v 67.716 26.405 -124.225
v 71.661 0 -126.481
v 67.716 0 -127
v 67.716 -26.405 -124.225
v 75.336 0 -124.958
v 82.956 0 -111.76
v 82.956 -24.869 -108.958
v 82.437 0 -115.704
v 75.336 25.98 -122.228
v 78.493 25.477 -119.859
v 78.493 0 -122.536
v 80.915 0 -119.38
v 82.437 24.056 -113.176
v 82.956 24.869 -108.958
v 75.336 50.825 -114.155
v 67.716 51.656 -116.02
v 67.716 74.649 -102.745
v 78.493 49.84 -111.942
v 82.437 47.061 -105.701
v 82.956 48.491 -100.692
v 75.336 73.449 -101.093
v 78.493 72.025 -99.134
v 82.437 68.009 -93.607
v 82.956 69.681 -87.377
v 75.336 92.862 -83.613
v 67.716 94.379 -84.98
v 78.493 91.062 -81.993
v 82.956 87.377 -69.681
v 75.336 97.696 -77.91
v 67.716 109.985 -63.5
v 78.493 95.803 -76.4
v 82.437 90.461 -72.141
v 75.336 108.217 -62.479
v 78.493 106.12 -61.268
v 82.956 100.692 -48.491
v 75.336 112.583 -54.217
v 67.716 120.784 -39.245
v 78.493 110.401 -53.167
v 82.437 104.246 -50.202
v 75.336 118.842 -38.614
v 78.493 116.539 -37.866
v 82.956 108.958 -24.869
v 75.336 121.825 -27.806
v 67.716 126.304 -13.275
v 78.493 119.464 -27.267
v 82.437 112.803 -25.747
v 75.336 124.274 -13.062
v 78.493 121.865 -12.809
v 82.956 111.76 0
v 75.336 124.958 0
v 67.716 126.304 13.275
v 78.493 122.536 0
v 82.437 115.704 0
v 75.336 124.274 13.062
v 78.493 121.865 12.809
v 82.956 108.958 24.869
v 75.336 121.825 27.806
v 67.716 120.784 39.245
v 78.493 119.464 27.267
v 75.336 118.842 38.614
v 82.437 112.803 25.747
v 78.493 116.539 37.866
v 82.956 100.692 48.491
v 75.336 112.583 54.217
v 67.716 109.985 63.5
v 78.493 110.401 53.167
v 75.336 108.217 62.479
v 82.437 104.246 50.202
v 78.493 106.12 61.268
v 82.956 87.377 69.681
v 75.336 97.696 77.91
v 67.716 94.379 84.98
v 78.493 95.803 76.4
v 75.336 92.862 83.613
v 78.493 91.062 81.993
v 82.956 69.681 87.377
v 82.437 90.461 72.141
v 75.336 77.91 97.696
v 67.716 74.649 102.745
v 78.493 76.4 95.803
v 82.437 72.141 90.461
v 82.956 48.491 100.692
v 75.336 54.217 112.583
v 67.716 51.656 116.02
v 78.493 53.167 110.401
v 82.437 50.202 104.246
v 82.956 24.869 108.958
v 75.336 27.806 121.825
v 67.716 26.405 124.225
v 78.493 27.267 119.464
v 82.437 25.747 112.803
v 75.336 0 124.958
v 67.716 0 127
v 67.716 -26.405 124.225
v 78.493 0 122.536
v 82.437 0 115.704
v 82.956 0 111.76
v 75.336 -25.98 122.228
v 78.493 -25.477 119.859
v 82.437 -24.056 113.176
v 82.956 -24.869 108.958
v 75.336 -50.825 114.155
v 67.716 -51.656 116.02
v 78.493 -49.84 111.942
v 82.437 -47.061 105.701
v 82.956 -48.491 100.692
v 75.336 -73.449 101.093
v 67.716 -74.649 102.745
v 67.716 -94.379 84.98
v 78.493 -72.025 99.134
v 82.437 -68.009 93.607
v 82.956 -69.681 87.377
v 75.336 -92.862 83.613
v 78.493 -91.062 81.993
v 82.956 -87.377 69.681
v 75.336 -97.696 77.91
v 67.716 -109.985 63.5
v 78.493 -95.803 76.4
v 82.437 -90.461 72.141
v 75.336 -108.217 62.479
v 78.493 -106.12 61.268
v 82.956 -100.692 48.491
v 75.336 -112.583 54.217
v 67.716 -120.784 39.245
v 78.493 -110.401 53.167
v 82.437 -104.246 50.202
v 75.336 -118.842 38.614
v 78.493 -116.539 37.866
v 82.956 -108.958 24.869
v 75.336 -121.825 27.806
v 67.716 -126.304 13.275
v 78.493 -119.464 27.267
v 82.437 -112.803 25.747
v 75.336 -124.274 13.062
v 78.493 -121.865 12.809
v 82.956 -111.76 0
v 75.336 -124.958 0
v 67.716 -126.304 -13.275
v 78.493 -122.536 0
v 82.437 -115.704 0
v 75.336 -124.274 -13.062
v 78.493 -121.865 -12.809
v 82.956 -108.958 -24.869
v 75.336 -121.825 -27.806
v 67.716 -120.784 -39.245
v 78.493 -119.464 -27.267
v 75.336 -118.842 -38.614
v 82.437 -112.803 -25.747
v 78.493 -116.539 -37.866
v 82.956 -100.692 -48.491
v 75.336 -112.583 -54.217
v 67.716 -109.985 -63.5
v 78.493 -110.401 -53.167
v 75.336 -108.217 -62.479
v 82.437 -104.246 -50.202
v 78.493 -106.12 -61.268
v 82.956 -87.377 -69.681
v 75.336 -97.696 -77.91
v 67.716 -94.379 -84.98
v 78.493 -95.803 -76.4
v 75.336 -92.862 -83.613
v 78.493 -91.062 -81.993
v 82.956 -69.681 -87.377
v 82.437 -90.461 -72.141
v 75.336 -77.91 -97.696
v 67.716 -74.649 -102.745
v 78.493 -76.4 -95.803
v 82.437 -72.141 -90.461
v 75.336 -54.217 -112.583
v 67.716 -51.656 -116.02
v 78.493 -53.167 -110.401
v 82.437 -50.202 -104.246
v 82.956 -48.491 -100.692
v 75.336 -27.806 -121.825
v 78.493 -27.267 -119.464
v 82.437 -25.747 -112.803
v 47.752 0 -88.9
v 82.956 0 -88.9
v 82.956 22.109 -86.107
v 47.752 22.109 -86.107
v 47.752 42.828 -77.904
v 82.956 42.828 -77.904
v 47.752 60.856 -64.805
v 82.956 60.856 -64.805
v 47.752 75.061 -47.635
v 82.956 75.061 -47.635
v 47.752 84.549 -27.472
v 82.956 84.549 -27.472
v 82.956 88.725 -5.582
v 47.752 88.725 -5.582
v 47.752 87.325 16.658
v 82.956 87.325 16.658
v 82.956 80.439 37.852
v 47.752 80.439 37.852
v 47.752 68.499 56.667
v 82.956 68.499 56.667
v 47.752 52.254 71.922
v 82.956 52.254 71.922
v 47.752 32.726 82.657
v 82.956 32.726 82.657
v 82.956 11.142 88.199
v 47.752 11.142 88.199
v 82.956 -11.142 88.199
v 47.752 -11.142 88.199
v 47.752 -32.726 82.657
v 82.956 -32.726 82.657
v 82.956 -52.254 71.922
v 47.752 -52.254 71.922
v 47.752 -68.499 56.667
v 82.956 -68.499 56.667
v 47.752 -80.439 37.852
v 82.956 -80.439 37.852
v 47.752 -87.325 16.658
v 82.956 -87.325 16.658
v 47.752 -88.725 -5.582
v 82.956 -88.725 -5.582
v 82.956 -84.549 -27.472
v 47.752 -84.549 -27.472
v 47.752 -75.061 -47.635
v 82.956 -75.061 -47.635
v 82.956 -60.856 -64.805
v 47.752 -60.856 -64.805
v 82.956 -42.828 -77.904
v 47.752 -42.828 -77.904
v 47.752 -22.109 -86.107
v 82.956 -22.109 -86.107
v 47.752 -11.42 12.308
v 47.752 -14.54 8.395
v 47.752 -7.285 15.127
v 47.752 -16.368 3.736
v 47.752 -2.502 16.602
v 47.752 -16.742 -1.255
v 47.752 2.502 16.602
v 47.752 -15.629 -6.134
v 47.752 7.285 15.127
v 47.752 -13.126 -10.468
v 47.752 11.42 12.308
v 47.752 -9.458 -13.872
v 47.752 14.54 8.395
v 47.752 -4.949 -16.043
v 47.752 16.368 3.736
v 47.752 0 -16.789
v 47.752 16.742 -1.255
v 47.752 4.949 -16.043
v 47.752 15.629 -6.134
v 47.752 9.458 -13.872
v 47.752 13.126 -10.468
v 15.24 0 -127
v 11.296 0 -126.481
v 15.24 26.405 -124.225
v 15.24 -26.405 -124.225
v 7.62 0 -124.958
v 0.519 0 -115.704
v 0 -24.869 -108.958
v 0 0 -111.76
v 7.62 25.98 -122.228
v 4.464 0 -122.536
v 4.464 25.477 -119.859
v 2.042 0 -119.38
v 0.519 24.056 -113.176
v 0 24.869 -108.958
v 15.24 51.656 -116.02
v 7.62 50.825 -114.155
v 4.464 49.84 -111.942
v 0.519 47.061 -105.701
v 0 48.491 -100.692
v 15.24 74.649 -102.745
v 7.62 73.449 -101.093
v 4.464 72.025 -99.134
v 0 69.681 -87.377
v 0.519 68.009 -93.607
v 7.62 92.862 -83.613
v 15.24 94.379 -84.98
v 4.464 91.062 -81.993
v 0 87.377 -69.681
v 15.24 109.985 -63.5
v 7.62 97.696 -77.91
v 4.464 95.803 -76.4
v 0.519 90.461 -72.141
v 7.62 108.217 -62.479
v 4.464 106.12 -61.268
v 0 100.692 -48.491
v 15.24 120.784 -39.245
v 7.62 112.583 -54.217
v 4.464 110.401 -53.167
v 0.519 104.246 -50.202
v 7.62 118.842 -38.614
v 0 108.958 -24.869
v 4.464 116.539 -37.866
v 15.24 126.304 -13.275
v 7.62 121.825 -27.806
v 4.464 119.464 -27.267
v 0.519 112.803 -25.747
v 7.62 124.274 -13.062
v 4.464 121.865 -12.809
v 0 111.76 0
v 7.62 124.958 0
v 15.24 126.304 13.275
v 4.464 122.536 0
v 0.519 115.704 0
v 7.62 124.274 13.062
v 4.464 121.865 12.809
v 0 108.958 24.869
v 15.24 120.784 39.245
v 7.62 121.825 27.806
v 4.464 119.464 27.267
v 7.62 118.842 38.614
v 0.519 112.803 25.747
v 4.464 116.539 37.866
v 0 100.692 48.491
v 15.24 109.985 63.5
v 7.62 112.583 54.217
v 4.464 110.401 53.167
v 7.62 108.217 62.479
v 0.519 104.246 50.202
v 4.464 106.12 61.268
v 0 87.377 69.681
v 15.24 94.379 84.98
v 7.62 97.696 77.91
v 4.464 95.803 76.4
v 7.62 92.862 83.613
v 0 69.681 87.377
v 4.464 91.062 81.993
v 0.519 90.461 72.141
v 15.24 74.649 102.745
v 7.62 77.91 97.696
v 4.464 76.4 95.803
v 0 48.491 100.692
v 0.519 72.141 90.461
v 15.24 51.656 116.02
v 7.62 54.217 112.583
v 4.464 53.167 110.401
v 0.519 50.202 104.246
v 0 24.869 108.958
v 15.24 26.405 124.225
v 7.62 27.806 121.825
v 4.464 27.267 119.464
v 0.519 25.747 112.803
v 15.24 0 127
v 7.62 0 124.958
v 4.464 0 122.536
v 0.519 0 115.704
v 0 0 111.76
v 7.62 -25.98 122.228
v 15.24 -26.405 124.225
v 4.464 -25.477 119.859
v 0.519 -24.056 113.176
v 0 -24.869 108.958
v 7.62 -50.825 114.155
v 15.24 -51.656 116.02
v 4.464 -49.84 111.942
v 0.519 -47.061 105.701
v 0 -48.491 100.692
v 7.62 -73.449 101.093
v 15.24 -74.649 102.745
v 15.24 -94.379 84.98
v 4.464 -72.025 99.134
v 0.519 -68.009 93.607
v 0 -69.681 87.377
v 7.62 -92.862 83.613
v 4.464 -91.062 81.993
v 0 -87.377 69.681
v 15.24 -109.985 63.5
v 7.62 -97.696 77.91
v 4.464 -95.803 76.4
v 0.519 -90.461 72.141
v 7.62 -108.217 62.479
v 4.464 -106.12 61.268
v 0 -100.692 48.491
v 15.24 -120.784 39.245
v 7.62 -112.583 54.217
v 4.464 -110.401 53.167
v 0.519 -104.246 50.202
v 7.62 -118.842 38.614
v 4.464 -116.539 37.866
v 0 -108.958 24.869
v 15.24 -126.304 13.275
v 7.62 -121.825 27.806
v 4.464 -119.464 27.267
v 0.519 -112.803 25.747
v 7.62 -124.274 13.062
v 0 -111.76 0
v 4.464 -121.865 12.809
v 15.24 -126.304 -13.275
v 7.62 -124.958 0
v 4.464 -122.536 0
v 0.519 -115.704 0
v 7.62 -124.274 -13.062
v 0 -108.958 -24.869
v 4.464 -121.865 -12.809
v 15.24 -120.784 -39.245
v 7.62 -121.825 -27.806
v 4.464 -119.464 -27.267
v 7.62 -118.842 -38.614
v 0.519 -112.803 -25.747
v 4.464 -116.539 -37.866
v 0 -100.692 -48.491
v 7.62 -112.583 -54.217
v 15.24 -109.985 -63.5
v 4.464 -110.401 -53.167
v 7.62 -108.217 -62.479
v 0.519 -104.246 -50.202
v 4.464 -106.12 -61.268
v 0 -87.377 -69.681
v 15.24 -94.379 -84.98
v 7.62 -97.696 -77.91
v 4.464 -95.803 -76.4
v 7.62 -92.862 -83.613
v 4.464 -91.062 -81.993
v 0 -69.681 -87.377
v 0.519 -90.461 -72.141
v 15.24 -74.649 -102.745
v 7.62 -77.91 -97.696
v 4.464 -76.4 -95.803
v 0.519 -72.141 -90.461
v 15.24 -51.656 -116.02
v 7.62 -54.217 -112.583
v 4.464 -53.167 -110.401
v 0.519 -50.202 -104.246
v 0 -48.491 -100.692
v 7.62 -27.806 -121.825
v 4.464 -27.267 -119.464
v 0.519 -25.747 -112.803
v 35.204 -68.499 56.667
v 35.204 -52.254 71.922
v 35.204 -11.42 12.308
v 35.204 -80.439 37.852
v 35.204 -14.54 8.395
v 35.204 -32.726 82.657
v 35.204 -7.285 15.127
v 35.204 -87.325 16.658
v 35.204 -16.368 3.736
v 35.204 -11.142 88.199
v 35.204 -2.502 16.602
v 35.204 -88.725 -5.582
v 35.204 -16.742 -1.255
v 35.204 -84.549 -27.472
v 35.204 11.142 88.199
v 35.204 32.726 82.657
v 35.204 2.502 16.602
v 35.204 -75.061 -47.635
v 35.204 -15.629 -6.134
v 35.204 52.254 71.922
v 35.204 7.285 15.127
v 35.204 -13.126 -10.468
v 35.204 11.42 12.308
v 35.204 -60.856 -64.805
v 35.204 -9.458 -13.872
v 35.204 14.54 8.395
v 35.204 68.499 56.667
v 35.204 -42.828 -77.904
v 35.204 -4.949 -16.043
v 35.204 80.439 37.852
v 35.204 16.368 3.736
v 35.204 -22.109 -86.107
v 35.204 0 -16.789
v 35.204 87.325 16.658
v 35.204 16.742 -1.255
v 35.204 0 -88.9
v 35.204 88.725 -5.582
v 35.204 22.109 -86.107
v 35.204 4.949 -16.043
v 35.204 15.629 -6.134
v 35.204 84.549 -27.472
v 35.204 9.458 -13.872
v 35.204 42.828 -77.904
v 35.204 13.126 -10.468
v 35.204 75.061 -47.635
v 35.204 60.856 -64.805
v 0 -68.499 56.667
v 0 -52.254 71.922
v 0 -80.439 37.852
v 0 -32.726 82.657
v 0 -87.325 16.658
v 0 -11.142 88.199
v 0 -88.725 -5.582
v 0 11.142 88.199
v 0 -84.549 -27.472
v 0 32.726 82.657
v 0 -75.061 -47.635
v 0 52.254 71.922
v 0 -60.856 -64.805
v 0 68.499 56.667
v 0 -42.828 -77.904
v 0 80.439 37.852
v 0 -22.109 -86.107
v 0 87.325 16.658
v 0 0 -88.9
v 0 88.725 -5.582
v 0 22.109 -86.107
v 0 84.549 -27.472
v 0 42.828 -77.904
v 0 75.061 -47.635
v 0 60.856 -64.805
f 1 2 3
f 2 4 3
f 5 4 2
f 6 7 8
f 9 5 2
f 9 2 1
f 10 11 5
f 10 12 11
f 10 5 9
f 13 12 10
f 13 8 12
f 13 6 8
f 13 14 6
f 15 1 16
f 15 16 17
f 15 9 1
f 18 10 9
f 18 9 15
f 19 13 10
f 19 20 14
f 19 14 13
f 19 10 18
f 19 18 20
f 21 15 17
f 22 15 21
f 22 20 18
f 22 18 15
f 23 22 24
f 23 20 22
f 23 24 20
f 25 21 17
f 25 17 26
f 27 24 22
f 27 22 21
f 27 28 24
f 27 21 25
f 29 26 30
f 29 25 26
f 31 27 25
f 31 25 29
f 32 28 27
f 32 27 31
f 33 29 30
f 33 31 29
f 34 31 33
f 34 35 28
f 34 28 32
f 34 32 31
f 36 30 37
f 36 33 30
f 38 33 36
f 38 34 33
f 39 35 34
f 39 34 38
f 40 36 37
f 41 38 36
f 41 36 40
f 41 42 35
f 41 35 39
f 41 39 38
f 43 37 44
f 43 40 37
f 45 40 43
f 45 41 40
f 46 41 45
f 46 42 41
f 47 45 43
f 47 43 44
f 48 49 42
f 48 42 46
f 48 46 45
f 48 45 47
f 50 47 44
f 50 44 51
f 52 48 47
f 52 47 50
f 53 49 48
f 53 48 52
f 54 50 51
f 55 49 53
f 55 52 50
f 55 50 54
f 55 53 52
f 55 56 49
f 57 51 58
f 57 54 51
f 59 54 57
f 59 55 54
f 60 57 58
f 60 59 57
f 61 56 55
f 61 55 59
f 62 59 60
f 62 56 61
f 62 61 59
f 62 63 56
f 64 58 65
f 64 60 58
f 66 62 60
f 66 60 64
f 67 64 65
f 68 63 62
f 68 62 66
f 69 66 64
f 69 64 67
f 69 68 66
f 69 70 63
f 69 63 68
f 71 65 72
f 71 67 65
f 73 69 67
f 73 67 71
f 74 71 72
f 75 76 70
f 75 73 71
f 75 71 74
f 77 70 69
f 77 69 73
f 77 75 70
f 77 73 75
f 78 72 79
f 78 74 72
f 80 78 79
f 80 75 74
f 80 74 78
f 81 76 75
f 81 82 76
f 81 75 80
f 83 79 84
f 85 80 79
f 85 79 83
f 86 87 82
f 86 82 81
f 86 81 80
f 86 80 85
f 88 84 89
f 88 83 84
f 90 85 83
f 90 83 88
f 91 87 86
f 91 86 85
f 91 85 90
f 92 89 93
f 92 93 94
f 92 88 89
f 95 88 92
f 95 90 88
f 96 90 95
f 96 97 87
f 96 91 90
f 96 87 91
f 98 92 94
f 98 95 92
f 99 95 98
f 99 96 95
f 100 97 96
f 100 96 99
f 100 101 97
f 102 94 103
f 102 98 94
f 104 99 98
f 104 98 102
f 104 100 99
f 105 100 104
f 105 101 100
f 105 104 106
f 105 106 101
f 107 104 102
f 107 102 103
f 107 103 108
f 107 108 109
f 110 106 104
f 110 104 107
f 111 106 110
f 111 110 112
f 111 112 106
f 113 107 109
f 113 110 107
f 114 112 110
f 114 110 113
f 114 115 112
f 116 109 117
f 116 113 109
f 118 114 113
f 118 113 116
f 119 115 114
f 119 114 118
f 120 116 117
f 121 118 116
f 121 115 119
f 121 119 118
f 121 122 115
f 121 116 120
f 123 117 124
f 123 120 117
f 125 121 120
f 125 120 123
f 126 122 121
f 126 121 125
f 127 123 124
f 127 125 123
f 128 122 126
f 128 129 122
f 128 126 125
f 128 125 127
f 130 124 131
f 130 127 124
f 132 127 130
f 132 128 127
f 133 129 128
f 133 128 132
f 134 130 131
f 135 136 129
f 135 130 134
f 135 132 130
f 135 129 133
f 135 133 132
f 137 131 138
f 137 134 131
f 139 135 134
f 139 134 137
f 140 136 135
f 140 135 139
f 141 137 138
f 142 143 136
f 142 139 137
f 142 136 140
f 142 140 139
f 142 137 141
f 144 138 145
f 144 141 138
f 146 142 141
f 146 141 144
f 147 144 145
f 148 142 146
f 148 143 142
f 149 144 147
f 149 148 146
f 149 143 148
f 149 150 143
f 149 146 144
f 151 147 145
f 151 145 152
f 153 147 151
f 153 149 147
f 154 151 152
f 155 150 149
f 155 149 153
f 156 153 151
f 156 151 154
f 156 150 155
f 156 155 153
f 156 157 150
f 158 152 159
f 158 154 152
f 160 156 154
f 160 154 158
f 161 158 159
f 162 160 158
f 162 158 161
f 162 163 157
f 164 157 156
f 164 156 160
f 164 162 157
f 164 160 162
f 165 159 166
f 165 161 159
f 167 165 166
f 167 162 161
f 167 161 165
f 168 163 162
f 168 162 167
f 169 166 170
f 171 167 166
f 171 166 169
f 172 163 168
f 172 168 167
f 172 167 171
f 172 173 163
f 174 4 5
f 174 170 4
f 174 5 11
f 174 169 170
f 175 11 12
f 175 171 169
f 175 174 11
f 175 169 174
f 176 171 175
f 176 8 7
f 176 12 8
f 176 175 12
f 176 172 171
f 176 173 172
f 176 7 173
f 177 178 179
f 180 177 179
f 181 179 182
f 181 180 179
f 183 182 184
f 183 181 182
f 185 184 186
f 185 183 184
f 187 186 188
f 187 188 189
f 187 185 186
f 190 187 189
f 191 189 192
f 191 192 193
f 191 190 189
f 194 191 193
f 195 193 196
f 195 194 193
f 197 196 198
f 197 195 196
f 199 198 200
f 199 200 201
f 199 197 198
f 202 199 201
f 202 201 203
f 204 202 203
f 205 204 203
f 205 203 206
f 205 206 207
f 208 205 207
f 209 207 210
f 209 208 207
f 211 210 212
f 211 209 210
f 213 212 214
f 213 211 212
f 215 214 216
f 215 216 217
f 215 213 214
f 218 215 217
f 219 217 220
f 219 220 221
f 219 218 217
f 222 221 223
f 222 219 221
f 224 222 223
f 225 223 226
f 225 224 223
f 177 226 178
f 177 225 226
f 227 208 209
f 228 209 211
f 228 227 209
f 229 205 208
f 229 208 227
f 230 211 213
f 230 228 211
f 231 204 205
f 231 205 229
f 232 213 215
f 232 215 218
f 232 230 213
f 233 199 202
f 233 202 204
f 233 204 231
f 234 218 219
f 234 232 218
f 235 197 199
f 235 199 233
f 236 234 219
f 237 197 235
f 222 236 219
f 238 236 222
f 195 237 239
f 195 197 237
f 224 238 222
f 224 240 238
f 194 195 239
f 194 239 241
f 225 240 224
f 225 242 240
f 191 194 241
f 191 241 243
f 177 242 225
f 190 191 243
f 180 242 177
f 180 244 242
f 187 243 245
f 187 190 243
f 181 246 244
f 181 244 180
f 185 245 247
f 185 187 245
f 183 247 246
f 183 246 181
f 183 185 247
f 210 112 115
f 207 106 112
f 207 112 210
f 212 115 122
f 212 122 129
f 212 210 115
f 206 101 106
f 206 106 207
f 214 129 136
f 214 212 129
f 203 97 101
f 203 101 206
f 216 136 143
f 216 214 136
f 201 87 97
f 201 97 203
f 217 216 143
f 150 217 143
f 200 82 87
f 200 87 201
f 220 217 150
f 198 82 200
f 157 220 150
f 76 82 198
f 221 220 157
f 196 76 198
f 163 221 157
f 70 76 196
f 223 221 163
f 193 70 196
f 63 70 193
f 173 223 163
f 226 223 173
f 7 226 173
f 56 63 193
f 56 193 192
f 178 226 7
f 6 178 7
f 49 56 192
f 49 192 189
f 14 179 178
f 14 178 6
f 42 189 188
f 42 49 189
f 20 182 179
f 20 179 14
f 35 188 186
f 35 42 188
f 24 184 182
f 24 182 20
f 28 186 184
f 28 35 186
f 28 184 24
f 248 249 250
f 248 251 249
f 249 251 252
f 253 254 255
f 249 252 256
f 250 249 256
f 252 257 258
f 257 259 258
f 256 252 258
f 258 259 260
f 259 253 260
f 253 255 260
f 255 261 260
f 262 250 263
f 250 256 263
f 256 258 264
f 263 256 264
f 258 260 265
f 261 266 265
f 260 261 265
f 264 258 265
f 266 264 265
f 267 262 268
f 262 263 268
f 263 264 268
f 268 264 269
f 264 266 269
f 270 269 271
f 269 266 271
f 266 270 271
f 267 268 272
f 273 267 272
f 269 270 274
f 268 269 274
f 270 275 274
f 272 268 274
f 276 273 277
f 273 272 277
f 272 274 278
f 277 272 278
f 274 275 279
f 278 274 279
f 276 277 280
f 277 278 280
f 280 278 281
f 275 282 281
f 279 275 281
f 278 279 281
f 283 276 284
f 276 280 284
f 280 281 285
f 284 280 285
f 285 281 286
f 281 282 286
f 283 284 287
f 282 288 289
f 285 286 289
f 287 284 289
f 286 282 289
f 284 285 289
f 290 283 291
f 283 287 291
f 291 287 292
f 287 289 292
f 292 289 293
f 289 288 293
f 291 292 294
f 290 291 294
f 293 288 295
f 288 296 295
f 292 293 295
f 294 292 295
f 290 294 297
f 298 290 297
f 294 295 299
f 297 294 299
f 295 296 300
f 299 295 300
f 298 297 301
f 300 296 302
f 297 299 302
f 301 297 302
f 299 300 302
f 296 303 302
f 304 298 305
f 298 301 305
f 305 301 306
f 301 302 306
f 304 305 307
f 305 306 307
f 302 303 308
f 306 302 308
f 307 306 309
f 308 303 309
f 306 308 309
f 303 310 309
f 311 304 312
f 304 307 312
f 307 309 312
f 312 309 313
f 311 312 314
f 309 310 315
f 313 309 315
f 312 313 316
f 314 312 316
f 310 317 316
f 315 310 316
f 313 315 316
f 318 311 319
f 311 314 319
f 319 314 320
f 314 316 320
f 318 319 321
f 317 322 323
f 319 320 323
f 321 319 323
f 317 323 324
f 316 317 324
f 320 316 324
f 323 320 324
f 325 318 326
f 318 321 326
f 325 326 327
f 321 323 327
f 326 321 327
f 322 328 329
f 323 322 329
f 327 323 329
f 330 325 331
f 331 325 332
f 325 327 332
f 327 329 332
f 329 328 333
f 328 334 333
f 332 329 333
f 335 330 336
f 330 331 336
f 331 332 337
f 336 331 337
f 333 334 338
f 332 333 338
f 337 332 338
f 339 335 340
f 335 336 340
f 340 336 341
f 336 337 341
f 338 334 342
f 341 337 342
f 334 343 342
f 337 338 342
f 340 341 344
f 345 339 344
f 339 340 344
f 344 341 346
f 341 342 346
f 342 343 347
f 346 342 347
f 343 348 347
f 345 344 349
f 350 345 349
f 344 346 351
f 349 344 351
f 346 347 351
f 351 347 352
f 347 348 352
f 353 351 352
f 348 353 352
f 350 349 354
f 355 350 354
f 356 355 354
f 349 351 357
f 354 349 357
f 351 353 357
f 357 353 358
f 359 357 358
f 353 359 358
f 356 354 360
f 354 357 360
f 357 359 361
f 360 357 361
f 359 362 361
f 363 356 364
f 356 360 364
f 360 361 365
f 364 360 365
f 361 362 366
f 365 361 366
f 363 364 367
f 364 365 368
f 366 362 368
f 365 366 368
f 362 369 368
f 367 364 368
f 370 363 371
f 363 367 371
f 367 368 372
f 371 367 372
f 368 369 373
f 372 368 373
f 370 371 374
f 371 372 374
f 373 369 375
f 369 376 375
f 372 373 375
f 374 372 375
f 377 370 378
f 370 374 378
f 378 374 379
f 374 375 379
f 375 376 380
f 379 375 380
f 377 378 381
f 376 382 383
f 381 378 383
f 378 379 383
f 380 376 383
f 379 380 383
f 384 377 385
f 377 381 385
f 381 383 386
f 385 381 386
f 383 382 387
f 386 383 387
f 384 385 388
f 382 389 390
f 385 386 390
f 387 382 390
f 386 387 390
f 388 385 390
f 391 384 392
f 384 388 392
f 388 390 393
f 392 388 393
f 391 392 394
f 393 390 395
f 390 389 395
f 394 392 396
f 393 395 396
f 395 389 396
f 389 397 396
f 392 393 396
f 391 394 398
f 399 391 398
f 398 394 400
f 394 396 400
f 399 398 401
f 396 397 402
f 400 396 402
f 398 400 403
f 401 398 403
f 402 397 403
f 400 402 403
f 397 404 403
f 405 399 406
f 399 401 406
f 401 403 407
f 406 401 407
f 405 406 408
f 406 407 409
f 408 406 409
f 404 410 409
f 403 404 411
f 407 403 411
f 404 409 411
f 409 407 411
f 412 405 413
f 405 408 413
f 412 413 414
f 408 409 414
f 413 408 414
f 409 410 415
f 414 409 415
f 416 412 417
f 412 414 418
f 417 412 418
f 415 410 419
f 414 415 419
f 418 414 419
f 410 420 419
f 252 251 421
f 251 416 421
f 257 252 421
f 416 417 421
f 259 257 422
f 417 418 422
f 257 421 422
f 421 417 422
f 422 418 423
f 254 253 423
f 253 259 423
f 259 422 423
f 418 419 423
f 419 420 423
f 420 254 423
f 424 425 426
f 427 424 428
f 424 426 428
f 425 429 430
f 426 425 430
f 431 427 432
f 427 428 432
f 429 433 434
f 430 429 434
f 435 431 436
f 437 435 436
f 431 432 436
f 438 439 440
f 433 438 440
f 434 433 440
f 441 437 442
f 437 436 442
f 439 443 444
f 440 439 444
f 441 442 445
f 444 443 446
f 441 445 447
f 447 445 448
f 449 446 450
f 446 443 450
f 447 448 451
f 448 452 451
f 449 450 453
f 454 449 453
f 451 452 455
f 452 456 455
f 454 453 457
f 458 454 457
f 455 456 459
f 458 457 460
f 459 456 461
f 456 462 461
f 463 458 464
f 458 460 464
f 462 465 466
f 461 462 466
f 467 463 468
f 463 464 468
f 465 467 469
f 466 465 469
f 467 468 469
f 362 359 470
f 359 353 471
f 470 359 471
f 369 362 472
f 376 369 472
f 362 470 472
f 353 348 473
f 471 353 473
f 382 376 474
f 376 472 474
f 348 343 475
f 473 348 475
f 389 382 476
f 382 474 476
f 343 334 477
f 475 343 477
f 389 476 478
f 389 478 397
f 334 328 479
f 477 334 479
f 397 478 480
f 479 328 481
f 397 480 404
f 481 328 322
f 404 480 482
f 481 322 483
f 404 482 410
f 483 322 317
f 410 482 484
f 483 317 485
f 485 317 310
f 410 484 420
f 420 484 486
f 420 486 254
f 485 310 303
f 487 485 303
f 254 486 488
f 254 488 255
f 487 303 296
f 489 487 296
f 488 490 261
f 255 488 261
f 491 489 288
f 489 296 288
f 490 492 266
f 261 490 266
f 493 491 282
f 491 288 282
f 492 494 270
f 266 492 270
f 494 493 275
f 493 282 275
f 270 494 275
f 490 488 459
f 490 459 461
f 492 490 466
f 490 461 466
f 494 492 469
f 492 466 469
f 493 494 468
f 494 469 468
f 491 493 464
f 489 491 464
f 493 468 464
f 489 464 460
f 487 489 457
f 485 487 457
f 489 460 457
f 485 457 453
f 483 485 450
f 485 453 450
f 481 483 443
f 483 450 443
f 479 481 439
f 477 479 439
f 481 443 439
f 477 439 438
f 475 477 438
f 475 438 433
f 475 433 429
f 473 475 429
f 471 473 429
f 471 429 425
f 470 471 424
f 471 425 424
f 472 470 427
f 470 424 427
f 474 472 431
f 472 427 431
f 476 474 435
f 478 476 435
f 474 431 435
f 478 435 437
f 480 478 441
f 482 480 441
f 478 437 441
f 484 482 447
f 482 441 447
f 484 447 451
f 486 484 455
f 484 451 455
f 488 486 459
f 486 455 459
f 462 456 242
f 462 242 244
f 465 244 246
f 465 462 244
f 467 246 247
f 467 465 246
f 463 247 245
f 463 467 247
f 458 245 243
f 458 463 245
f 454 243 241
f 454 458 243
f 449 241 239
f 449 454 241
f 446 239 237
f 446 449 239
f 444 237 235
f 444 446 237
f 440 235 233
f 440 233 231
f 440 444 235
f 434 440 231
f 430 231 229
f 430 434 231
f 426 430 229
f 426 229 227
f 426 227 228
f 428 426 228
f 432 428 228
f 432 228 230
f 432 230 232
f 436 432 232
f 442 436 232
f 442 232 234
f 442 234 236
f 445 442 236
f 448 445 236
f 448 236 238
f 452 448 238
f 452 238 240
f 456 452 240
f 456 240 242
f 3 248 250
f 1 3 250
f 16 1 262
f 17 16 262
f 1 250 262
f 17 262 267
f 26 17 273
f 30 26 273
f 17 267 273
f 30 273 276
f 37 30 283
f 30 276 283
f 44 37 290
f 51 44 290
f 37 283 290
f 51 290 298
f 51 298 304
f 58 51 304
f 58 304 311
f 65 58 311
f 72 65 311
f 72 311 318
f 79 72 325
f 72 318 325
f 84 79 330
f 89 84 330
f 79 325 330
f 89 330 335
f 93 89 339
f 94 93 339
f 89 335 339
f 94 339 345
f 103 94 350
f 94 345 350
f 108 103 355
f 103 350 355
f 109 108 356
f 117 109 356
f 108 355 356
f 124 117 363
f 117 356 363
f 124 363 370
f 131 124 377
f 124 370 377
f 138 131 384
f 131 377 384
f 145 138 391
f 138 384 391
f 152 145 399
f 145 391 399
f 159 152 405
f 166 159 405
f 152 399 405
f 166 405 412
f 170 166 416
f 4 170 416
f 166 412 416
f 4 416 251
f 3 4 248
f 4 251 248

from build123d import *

# Parameters (mm, degrees)
SKETCH1_R           = 127
SKETCH1_R_2         = 16.7894
BOSS_EXTRUDE1_DEPTH = 82.9564
FILLET1_R           = 15.24
CUT_EXTRUDE1_START  = -35.2044
SKETCH2_R           = 88.9
SKETCH2_R_2         = 16.7894
CUT_EXTRUDE1_DEPTH  = 35.2044


with BuildPart() as part:
    # Sketch1 → Boss-Extrude1 (new body)
    with BuildSketch(Plane(origin=(0, 0, 0), x_dir=(0, 0, -1), z_dir=(1, 0, 0))):
        Circle(SKETCH1_R)
        Circle(SKETCH1_R_2, mode=Mode.SUBTRACT)
    extrude(amount=BOSS_EXTRUDE1_DEPTH)

    # Fillet1
    fillet1_edges = [part.edges().sort_by_distance(p)[0] for p in [
        (0, 0, 127),
        (82.9564, 0, 127),
    ]]
    fillet(fillet1_edges, radius=FILLET1_R)

    # Sketch2 → Cut-Extrude1 (cut)
    with BuildSketch(Plane(origin=(82.9564, 0, 0), x_dir=(0, 0, -1), z_dir=(1, 0, 0)).offset(CUT_EXTRUDE1_START)):
        Circle(SKETCH2_R)
        Circle(SKETCH2_R_2, mode=Mode.SUBTRACT)
    cut_extrude1 = extrude(amount=CUT_EXTRUDE1_DEPTH, mode=Mode.SUBTRACT)

    # Mirror1: Cut-Extrude1 across plane
    add(cut_extrude1.mirror(Plane.ZY.offset(-41.4782)), mode=Mode.SUBTRACT)


solid = part.part
